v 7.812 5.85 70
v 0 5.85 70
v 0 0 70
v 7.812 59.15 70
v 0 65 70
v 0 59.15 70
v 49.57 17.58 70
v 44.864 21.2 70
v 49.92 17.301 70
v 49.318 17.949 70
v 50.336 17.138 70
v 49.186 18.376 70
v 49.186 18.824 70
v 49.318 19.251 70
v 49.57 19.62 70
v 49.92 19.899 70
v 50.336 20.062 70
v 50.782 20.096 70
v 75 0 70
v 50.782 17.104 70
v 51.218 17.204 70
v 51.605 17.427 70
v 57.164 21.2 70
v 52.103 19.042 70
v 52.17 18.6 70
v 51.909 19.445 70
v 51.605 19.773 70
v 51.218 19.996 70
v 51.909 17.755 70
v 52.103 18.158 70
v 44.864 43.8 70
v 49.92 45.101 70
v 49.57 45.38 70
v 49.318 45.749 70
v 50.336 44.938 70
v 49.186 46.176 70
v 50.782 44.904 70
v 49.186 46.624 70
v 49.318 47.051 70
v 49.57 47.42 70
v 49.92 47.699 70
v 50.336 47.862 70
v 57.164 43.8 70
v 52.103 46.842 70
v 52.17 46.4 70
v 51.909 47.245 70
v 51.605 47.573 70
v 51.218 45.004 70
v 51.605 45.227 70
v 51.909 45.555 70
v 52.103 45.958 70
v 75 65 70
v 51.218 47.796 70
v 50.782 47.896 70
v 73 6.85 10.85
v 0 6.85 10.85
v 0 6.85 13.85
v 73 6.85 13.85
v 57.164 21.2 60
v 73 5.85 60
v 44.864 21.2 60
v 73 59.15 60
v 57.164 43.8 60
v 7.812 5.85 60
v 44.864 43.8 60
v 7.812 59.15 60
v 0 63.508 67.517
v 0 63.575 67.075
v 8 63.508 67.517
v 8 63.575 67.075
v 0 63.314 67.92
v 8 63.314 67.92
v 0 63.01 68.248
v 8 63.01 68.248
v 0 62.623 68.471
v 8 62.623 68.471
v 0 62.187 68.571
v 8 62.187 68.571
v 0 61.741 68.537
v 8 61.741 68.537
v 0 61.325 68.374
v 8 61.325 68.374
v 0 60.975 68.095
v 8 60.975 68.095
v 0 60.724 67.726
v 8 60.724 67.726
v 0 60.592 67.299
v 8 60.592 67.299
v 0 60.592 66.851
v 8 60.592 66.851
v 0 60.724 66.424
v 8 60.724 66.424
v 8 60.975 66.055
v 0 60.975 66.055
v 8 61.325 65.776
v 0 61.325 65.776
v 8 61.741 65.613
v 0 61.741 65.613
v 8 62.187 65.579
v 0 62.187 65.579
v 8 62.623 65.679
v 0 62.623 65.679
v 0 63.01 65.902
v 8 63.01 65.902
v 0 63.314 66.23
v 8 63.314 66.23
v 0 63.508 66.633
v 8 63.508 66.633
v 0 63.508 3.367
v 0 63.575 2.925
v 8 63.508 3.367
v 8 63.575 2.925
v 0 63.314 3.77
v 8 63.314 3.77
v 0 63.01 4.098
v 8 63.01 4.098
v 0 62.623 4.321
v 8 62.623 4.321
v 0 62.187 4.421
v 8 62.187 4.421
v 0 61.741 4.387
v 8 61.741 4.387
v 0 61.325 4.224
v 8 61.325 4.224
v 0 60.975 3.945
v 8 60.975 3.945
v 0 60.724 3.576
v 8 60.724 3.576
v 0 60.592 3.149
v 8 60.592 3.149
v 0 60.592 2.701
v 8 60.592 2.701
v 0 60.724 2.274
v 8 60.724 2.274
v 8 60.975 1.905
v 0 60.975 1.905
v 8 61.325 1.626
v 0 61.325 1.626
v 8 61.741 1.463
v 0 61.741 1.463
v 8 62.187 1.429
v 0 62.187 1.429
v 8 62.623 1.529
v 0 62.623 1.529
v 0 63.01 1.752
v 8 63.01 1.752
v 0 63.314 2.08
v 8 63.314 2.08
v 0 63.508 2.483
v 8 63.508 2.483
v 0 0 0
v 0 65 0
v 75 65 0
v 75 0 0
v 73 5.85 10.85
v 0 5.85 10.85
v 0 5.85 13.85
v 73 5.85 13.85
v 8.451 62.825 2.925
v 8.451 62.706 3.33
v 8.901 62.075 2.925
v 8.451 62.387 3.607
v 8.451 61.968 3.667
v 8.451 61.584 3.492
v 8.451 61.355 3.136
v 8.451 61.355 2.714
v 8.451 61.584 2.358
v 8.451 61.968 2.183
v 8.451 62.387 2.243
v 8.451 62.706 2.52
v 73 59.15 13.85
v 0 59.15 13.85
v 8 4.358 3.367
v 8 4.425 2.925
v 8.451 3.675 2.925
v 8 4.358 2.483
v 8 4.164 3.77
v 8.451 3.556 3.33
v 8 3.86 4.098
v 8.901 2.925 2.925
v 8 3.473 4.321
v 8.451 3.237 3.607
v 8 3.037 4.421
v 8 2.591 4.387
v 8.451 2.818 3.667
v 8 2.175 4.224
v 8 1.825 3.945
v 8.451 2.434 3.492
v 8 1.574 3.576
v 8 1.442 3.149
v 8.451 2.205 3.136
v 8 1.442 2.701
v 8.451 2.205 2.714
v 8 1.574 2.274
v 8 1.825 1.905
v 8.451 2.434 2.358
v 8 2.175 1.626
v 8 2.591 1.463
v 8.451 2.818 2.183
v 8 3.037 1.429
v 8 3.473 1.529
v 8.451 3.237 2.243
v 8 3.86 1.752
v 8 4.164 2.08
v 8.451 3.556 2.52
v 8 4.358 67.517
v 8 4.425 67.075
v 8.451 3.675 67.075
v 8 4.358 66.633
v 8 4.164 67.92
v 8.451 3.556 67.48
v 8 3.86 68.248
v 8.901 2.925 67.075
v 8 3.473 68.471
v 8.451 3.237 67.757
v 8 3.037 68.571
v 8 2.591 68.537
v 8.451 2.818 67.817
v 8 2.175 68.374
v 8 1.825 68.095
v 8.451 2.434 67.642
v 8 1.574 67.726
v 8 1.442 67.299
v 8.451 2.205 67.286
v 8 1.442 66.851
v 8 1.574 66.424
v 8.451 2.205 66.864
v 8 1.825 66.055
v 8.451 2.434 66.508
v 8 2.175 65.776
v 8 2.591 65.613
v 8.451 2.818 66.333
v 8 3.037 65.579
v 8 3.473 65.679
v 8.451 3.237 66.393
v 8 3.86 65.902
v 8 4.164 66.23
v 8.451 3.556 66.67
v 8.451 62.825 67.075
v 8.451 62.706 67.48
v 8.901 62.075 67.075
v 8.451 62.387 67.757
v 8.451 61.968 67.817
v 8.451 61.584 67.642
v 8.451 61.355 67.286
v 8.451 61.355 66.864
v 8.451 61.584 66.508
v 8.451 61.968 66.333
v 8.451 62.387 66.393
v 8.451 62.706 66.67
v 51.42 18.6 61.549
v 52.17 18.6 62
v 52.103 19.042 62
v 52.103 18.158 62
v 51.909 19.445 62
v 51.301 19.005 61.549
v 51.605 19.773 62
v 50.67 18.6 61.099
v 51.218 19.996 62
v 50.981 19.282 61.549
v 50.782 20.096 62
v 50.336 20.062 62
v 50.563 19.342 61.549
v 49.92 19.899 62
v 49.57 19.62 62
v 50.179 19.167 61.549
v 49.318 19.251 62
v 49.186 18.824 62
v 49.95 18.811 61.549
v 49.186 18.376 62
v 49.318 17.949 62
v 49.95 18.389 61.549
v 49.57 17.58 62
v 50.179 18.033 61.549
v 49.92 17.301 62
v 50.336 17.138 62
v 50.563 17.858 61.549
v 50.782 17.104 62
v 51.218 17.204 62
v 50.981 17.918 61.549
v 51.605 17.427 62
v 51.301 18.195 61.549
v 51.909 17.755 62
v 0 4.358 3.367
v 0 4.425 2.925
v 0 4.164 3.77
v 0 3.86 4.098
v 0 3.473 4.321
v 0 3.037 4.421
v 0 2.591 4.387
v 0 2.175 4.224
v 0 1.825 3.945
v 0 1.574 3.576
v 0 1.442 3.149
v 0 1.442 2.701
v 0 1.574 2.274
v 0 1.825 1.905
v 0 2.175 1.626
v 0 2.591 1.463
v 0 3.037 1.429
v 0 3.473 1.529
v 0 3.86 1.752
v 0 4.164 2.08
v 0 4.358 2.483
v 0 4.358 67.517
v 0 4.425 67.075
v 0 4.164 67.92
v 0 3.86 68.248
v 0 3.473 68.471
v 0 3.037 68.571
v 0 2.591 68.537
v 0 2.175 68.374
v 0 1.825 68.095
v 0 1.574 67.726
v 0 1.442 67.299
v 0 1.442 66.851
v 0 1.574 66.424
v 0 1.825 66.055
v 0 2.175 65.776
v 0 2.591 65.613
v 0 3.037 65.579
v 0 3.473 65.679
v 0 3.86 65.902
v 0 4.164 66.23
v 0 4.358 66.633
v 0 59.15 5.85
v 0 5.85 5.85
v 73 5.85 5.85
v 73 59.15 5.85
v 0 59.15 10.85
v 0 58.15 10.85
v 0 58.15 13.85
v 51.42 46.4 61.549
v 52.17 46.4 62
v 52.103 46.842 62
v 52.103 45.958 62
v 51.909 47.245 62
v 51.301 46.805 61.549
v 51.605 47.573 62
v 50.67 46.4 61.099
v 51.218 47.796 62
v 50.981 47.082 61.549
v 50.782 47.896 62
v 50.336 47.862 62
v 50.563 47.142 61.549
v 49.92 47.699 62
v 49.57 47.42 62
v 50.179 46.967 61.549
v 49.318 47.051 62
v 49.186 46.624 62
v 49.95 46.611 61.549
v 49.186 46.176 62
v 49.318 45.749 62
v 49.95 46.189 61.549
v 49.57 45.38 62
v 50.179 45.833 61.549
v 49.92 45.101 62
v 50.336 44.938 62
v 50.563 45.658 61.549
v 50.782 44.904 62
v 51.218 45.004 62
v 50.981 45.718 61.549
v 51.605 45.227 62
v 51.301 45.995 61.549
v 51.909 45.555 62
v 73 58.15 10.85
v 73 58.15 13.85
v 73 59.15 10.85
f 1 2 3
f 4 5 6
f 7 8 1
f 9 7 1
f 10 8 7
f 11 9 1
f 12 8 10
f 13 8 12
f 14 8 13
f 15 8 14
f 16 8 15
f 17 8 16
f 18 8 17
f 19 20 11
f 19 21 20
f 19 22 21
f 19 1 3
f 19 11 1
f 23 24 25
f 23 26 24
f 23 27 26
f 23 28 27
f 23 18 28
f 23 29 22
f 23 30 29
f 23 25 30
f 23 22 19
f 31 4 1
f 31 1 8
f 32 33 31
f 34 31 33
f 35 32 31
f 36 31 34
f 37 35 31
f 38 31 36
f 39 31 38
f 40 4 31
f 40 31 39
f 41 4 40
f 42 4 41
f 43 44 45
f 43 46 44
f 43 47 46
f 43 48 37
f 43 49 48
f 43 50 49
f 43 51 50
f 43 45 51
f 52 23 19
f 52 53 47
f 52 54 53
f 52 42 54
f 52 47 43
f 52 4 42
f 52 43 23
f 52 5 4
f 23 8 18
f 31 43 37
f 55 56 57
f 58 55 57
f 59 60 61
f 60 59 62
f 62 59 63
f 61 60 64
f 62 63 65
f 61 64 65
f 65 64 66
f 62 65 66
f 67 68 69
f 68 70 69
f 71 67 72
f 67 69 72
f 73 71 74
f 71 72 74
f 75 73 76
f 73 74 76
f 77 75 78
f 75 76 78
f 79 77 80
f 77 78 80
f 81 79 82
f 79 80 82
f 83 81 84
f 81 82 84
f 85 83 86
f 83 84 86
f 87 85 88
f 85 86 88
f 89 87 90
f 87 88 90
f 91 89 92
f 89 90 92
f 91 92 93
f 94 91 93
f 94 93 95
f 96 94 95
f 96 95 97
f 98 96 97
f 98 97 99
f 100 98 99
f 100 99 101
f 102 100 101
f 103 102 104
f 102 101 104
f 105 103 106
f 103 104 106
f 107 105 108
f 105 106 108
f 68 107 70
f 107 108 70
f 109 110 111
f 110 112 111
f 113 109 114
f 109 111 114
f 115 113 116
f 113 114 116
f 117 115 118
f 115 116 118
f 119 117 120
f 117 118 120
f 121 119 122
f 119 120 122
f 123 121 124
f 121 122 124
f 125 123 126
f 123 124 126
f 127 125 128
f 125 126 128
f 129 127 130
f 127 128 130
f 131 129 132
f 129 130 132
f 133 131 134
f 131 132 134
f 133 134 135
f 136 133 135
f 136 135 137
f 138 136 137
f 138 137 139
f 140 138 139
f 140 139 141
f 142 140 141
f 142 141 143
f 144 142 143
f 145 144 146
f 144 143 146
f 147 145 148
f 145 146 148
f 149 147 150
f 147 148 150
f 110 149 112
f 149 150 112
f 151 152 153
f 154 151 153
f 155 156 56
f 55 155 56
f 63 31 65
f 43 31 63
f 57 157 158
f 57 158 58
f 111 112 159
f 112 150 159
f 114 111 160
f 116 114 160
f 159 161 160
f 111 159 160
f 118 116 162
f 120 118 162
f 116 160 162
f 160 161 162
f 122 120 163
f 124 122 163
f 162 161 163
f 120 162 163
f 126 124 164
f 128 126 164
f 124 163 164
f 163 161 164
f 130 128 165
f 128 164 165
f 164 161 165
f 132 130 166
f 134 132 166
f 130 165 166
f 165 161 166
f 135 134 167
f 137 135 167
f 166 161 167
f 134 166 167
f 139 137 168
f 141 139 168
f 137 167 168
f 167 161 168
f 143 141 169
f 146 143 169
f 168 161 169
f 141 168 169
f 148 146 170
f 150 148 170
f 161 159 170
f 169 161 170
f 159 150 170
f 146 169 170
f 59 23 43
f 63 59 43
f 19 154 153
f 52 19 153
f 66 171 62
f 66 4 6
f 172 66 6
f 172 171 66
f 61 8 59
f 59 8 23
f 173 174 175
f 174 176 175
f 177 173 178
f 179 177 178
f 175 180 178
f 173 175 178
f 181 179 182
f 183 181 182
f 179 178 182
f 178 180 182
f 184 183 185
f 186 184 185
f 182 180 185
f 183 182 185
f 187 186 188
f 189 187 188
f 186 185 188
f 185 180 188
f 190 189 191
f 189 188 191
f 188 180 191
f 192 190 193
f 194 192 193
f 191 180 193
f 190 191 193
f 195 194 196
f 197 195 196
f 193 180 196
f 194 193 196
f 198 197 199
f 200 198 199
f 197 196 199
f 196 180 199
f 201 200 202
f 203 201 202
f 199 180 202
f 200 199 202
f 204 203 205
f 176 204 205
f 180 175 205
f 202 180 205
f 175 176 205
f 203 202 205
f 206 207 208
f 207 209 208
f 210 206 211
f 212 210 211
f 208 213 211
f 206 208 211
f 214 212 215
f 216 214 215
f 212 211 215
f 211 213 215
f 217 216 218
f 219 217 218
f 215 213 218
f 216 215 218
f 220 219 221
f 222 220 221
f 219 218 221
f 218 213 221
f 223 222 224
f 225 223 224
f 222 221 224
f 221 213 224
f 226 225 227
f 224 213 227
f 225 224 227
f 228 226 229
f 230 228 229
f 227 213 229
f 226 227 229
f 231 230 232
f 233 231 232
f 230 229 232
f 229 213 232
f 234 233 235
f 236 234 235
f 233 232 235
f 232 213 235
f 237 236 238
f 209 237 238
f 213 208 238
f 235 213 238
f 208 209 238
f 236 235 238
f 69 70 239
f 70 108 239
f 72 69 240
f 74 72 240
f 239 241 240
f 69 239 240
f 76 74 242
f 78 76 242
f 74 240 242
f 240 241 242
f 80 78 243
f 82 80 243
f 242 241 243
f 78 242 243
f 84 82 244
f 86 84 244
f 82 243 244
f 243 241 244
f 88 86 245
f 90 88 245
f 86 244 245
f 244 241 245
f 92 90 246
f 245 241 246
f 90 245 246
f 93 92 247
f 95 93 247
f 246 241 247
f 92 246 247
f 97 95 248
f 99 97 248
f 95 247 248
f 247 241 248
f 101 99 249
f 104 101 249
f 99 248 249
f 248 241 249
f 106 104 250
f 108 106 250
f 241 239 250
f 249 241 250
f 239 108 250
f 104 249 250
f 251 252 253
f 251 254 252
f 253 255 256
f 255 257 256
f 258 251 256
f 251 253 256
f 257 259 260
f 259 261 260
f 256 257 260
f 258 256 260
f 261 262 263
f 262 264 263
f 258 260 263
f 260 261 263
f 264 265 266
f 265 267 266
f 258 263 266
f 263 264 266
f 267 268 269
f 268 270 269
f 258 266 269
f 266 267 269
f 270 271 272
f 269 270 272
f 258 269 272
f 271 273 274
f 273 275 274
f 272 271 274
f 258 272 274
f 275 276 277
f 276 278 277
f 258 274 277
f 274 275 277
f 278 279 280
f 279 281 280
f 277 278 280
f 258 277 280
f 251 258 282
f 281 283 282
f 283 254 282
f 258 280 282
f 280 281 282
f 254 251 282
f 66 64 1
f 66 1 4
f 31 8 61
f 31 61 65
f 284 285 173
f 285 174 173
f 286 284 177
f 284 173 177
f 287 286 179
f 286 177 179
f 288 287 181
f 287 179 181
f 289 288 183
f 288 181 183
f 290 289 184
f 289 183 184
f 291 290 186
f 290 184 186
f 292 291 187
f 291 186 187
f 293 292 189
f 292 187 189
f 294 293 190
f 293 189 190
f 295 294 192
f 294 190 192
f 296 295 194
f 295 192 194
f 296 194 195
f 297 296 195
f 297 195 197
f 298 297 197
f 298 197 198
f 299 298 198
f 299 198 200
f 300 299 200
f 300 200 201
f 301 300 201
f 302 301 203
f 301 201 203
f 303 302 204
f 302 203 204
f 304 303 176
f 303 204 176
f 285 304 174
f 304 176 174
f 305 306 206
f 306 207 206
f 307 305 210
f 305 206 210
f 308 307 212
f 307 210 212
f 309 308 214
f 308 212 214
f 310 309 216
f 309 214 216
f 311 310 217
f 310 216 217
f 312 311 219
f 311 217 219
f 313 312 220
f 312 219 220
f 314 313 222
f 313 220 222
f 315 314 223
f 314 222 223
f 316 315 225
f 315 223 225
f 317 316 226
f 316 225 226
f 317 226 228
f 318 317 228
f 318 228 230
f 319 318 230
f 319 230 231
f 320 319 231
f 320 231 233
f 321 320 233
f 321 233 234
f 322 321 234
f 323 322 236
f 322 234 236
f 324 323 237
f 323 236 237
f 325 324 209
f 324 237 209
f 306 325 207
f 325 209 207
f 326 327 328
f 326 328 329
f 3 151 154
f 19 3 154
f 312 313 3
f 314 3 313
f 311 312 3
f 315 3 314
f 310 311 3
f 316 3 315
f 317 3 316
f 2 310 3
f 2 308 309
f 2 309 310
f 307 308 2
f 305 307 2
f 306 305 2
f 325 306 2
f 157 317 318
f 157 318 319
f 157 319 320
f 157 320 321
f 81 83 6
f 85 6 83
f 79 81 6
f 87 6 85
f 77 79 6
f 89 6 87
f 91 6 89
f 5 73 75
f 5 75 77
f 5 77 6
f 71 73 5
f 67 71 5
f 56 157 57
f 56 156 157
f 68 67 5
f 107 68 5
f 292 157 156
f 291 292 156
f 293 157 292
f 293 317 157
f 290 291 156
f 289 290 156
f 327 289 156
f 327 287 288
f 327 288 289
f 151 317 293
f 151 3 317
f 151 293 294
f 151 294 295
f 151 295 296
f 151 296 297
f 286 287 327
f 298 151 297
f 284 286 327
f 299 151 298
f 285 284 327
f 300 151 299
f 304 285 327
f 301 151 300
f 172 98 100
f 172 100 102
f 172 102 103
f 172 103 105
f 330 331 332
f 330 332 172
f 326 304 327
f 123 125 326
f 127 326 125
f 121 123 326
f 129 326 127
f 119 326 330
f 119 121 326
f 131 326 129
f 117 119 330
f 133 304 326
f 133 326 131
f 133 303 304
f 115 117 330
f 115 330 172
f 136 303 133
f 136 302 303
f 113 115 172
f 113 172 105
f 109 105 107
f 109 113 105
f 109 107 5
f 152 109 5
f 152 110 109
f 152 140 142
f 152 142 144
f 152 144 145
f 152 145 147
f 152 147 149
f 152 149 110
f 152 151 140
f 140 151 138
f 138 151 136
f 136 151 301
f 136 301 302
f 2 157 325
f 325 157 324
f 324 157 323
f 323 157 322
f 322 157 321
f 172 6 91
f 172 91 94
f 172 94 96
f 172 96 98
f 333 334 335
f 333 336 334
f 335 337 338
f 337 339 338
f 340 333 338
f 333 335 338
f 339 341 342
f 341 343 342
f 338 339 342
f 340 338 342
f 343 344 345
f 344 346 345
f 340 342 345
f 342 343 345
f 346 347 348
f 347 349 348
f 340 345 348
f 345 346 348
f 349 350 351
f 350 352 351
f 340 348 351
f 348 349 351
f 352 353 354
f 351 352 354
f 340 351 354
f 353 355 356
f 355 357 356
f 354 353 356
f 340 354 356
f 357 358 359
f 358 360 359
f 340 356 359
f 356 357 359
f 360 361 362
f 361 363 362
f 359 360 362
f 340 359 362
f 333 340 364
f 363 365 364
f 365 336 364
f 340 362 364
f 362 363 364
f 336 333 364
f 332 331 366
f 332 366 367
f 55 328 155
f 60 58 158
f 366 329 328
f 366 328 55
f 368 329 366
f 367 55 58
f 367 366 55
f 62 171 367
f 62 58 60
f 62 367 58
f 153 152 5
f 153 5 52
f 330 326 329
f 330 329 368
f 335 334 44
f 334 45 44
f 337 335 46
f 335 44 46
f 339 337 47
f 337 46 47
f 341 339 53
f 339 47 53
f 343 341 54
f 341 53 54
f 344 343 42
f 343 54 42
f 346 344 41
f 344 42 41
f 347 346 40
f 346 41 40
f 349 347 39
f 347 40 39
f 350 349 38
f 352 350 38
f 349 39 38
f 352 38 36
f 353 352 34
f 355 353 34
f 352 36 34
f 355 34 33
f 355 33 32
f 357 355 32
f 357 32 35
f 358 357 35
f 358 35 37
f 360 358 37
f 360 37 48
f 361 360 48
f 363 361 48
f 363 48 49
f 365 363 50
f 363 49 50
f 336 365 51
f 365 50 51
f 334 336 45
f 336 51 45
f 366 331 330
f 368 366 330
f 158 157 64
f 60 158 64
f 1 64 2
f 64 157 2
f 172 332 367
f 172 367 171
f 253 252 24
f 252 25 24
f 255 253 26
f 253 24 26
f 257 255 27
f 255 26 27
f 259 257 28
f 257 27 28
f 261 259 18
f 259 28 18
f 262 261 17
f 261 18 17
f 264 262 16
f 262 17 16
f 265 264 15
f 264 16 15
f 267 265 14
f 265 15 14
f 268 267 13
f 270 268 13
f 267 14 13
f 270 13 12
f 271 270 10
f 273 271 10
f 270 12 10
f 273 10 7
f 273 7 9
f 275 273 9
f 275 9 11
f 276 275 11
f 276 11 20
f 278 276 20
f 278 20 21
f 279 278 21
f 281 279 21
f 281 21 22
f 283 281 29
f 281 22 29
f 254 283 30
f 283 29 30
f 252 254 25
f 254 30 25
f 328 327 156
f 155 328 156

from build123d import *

# Parameters (mm, degrees)
SKIZZE1_W                       = 75
SKIZZE1_H                       = 65
AUFSATZ_LINEAR_AUSTRAGEN1_DEPTH = 70
SKIZZE4_W                       = 54.15
SKIZZE4_H                       = 53.3
SCHNITT_LINEAR_AUSTRAGEN1_DEPTH = 73
SKIZZE9_W                       = 3
SKIZZE9_H                       = 1
AUFSATZ_LINEAR_AUSTRAGEN2_DEPTH = 73
SCHNITT_LINEAR_AUSTRAGEN3_REACH = 117.974
SKIZZE12_W                      = 7.812260402
SKIZZE12_H                      = 53.3
SCHNITT_LINEAR_AUSTRAGEN4_REACH = 123.45
SKIZZE15_W                      = 12.3
SKIZZE15_H                      = 22.6


# Read off the part's stored shape, not the designer's step: Ø3.0 (3) Durchmesser Bohrung1, Ø3.0 (3) Durchmesser Bohrung2
with BuildPart() as part:
    # Skizze1 → Aufsatz-Linear austragen1 (new body)
    with BuildSketch(Plane.XY):
        with Locations((37.5, 32.5)):
            Rectangle(SKIZZE1_W, SKIZZE1_H)
    extrude(amount=AUFSATZ_LINEAR_AUSTRAGEN1_DEPTH)

    # Skizze4 → Schnitt-Linear austragen1 (cut)
    with BuildSketch(Plane.ZY):
        with Locations((32.925, 32.5)):
            Rectangle(SKIZZE4_W, SKIZZE4_H)
    extrude(amount=-SCHNITT_LINEAR_AUSTRAGEN1_DEPTH, mode=Mode.SUBTRACT)

    # Skizze9 → Aufsatz-Linear austragen2 (add)
    with BuildSketch(Plane.ZY):
        with Locations((12.35, 58.65)):
            Rectangle(SKIZZE9_W, SKIZZE9_H)
        with Locations((12.35, 6.35)):
            Rectangle(SKIZZE9_W, SKIZZE9_H)
    extrude(amount=-AUFSATZ_LINEAR_AUSTRAGEN2_DEPTH)

    # Skizze12 → Schnitt-Linear austragen3 (cut, up to next)
    with BuildSketch(Plane(origin=(0, 0, 60), x_dir=(-1, 0, 0), z_dir=(0, 0, -1)), mode=Mode.PRIVATE) as schnitt_linear_austragen3_sk1:
        with Locations((-3.906130201, 32.5)):
            Rectangle(SKIZZE12_W, SKIZZE12_H)
    schnitt_linear_austragen3_tool1 = extrude(schnitt_linear_austragen3_sk1.sketch, amount=-SCHNITT_LINEAR_AUSTRAGEN3_REACH, mode=Mode.PRIVATE) & part.part
    add(schnitt_linear_austragen3_tool1.solids().sort_by_distance((3.90613, 32.5, 60))[0], mode=Mode.SUBTRACT)

    # Ø3.0 (3) Durchmesser Bohrung1 outline → Ø3.0 (3) Durchmesser Bohrung1 (revolve, cut)
    with BuildSketch(Plane(origin=(50.669703956, 18.6, 0), x_dir=(1, 0, 0), z_dir=(0, -1, 0))):
        Polygon((0, 70), (0, 61.098709071), (1.5, 62), (1.5, 70), align=None)
    revolve(axis=Axis((50.669703956, 18.6, 0), (0, 0, 1)), mode=Mode.SUBTRACT)

    # 3.0 _3_ Durchmesser Bohrung1 2 outline → 3.0 _3_ Durchmesser Bohrung1 2 (revolve, cut)
    with BuildSketch(Plane(origin=(50.669703956, 46.4, 0), x_dir=(1, 0, 0), z_dir=(0, -1, 0))):
        Polygon((0, 70), (0, 61.098709071), (1.5, 62), (1.5, 70), align=None)
    revolve(axis=Axis((50.669703956, 46.4, 0), (0, 0, 1)), mode=Mode.SUBTRACT)

    # Skizze15 → Schnitt-Linear austragen4 (cut, up to next)
    with BuildSketch(Plane.XY.offset(70), mode=Mode.PRIVATE) as schnitt_linear_austragen4_sk1:
        with Locations((51.013730389, 32.5)):
            Rectangle(SKIZZE15_W, SKIZZE15_H)
    schnitt_linear_austragen4_tool1 = extrude(schnitt_linear_austragen4_sk1.sketch, amount=-SCHNITT_LINEAR_AUSTRAGEN4_REACH, mode=Mode.PRIVATE) & part.part
    add(schnitt_linear_austragen4_tool1.solids().sort_by_distance((51.01373, 32.5, 70))[0], mode=Mode.SUBTRACT)

    # Ø3.0 (3) Durchmesser Bohrung2 outline → Ø3.0 (3) Durchmesser Bohrung2 (revolve, cut)
    with BuildSketch(Plane(origin=(0, 62.075, 2.925), x_dir=(0, 1, 0), z_dir=(0, 0, -1))):
        Polygon((1.5, 8), (0, 8.901290929), (0, 0), (1.5, 0), align=None)
    revolve(axis=Axis((0, 62.075, 2.925), (1, 0, 0)), mode=Mode.SUBTRACT)

    # 3.0 _3_ Durchmesser Bohrung2 2 outline → 3.0 _3_ Durchmesser Bohrung2 2 (revolve, cut)
    with BuildSketch(Plane(origin=(0, 2.925, 2.925), x_dir=(0, 1, 0), z_dir=(0, 0, -1))):
        Polygon((1.5, 8), (0, 8.901290929), (0, 0), (1.5, 0), align=None)
    revolve(axis=Axis((0, 2.925, 2.925), (1, 0, 0)), mode=Mode.SUBTRACT)

    # 3.0 _3_ Durchmesser Bohrung2 3 outline → 3.0 _3_ Durchmesser Bohrung2 3 (revolve, cut)
    with BuildSketch(Plane(origin=(0, 2.925, 67.075), x_dir=(0, 1, 0), z_dir=(0, 0, -1))):
        Polygon((1.5, 8), (0, 8.901290929), (0, 0), (1.5, 0), align=None)
    revolve(axis=Axis((0, 2.925, 67.075), (1, 0, 0)), mode=Mode.SUBTRACT)

    # 3.0 _3_ Durchmesser Bohrung2 4 outline → 3.0 _3_ Durchmesser Bohrung2 4 (revolve, cut)
    with BuildSketch(Plane(origin=(0, 62.075, 67.075), x_dir=(0, 1, 0), z_dir=(0, 0, -1))):
        Polygon((1.5, 8), (0, 8.901290929), (0, 0), (1.5, 0), align=None)
    revolve(axis=Axis((0, 62.075, 67.075), (1, 0, 0)), mode=Mode.SUBTRACT)


solid = part.part
